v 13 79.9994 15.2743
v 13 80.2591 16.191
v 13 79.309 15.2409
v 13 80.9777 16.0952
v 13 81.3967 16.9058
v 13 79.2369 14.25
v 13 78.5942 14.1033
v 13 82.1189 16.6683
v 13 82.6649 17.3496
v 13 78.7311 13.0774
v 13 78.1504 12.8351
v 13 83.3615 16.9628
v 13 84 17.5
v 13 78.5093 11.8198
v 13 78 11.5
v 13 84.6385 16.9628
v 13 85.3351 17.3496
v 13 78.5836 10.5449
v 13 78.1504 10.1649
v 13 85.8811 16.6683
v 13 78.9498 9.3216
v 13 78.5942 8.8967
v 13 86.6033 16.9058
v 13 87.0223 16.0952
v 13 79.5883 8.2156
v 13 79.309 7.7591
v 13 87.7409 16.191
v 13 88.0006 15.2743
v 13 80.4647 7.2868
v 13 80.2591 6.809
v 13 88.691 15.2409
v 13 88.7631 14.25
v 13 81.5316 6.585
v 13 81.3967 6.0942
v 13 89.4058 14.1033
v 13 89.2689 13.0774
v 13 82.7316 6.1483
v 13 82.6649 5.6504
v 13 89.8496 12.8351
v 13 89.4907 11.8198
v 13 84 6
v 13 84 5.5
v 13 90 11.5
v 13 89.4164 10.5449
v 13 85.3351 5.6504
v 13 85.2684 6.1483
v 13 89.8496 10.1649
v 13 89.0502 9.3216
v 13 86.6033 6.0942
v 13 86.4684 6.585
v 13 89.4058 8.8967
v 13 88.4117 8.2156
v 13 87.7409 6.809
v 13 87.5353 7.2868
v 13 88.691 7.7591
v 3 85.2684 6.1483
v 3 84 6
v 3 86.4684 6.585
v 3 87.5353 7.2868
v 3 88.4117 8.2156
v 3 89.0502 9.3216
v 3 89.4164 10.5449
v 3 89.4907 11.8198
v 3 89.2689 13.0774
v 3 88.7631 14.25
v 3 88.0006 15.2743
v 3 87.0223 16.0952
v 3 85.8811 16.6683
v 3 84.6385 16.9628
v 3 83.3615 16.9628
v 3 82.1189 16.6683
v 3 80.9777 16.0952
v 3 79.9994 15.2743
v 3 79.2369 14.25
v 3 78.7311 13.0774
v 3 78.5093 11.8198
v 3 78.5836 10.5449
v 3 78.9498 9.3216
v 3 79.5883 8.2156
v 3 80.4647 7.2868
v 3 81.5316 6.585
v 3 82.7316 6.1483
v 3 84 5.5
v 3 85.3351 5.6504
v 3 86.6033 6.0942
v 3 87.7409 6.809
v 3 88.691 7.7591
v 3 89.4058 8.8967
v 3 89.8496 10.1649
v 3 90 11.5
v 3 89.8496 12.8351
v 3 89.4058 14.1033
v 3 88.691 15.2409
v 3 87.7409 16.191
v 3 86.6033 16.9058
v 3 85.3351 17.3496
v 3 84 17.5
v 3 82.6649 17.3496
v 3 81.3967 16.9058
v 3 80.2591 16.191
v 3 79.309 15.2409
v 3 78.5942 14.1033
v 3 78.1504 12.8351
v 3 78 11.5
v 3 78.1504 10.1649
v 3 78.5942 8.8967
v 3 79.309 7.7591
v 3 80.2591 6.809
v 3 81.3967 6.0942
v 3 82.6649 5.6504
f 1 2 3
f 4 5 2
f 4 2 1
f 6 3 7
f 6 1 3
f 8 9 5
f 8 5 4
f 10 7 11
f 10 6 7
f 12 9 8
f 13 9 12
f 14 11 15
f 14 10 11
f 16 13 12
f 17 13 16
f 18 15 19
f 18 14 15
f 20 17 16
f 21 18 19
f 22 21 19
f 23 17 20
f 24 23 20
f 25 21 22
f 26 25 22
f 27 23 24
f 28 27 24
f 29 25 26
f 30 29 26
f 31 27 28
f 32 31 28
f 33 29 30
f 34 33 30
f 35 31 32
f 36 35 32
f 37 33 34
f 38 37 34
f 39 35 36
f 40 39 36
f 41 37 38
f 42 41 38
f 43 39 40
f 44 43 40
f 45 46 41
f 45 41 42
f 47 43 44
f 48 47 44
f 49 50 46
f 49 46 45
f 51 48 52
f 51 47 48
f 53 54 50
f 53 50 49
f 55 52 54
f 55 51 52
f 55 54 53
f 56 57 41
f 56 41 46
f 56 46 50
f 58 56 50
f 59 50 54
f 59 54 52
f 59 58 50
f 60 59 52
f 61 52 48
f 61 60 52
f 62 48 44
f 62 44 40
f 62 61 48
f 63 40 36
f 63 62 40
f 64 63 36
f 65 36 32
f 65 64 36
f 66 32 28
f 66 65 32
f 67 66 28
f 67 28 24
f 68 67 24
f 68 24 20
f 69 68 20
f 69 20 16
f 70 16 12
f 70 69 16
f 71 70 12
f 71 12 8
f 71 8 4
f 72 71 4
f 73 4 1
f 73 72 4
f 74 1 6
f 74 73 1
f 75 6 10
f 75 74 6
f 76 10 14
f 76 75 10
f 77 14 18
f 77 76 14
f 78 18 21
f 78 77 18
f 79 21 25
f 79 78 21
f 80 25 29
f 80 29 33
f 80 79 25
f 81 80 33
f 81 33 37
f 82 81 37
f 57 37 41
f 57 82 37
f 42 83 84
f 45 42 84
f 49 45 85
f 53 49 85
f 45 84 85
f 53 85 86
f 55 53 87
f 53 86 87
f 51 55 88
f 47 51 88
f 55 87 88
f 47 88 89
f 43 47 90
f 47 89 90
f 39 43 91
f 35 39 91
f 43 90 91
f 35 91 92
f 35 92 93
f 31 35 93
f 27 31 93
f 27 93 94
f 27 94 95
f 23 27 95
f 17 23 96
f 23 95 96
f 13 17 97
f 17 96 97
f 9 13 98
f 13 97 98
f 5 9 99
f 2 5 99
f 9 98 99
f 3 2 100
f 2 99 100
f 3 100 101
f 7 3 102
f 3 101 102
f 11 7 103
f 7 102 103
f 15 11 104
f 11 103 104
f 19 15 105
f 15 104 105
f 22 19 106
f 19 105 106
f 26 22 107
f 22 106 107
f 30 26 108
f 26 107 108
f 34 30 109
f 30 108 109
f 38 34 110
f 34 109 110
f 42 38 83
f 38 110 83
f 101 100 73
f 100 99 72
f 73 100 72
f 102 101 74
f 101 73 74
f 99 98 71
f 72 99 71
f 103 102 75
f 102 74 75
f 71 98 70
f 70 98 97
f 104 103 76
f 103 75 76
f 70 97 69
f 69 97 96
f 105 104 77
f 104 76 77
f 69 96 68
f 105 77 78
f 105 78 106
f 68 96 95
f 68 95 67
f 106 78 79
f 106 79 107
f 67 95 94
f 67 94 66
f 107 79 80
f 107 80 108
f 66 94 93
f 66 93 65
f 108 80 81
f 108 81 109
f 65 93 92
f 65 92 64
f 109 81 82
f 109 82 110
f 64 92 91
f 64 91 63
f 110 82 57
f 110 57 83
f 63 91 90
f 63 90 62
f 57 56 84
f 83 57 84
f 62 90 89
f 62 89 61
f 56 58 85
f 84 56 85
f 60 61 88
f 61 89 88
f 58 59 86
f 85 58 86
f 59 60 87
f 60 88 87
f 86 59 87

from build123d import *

# Parameters (mm, degrees)
CYLINDER034_R           = 5.5
CYLINDER034_DEPTH       = 10
CYLINDER034_PITCH_ANGLE = 90
CYLINDER_R              = 6
CYLINDER_DEPTH          = 10
CYLINDER_PITCH_ANGLE    = 90


with BuildPart() as cylinder034:
    # Cylinder034 → Cylinder034 (new body)
    with BuildSketch(Plane.XY):
        Circle(CYLINDER034_R)
    extrude(amount=CYLINDER034_DEPTH)


with BuildPart() as cylinder034_1:
    # Cylinder034 pitch: moved
    add(cylinder034.part.rotate(Axis((0, 0, 0), (0, 1, 0)), CYLINDER034_PITCH_ANGLE))


with BuildPart() as cylinder034_2:
    # Cylinder034 placement: moved
    add(cylinder034_1.part.moved(Location((3, 84, 11.5))))


with BuildPart() as cut059:
    # Cylinder → Cylinder (new body)
    with BuildSketch(Plane.XY):
        Circle(CYLINDER_R)
    extrude(amount=CYLINDER_DEPTH)


with BuildPart() as cut059_1:
    # Cylinder pitch: moved
    add(cut059.part.rotate(Axis((0, 0, 0), (0, 1, 0)), CYLINDER_PITCH_ANGLE))


with BuildPart() as cut059_2:
    # Cylinder placement: moved
    add(cut059_1.part.moved(Location((3, 84, 11.5))))

    # Cut059: cut Cylinder034
    add(cylinder034_2.part, mode=Mode.SUBTRACT)


solid = cut059_2.part
